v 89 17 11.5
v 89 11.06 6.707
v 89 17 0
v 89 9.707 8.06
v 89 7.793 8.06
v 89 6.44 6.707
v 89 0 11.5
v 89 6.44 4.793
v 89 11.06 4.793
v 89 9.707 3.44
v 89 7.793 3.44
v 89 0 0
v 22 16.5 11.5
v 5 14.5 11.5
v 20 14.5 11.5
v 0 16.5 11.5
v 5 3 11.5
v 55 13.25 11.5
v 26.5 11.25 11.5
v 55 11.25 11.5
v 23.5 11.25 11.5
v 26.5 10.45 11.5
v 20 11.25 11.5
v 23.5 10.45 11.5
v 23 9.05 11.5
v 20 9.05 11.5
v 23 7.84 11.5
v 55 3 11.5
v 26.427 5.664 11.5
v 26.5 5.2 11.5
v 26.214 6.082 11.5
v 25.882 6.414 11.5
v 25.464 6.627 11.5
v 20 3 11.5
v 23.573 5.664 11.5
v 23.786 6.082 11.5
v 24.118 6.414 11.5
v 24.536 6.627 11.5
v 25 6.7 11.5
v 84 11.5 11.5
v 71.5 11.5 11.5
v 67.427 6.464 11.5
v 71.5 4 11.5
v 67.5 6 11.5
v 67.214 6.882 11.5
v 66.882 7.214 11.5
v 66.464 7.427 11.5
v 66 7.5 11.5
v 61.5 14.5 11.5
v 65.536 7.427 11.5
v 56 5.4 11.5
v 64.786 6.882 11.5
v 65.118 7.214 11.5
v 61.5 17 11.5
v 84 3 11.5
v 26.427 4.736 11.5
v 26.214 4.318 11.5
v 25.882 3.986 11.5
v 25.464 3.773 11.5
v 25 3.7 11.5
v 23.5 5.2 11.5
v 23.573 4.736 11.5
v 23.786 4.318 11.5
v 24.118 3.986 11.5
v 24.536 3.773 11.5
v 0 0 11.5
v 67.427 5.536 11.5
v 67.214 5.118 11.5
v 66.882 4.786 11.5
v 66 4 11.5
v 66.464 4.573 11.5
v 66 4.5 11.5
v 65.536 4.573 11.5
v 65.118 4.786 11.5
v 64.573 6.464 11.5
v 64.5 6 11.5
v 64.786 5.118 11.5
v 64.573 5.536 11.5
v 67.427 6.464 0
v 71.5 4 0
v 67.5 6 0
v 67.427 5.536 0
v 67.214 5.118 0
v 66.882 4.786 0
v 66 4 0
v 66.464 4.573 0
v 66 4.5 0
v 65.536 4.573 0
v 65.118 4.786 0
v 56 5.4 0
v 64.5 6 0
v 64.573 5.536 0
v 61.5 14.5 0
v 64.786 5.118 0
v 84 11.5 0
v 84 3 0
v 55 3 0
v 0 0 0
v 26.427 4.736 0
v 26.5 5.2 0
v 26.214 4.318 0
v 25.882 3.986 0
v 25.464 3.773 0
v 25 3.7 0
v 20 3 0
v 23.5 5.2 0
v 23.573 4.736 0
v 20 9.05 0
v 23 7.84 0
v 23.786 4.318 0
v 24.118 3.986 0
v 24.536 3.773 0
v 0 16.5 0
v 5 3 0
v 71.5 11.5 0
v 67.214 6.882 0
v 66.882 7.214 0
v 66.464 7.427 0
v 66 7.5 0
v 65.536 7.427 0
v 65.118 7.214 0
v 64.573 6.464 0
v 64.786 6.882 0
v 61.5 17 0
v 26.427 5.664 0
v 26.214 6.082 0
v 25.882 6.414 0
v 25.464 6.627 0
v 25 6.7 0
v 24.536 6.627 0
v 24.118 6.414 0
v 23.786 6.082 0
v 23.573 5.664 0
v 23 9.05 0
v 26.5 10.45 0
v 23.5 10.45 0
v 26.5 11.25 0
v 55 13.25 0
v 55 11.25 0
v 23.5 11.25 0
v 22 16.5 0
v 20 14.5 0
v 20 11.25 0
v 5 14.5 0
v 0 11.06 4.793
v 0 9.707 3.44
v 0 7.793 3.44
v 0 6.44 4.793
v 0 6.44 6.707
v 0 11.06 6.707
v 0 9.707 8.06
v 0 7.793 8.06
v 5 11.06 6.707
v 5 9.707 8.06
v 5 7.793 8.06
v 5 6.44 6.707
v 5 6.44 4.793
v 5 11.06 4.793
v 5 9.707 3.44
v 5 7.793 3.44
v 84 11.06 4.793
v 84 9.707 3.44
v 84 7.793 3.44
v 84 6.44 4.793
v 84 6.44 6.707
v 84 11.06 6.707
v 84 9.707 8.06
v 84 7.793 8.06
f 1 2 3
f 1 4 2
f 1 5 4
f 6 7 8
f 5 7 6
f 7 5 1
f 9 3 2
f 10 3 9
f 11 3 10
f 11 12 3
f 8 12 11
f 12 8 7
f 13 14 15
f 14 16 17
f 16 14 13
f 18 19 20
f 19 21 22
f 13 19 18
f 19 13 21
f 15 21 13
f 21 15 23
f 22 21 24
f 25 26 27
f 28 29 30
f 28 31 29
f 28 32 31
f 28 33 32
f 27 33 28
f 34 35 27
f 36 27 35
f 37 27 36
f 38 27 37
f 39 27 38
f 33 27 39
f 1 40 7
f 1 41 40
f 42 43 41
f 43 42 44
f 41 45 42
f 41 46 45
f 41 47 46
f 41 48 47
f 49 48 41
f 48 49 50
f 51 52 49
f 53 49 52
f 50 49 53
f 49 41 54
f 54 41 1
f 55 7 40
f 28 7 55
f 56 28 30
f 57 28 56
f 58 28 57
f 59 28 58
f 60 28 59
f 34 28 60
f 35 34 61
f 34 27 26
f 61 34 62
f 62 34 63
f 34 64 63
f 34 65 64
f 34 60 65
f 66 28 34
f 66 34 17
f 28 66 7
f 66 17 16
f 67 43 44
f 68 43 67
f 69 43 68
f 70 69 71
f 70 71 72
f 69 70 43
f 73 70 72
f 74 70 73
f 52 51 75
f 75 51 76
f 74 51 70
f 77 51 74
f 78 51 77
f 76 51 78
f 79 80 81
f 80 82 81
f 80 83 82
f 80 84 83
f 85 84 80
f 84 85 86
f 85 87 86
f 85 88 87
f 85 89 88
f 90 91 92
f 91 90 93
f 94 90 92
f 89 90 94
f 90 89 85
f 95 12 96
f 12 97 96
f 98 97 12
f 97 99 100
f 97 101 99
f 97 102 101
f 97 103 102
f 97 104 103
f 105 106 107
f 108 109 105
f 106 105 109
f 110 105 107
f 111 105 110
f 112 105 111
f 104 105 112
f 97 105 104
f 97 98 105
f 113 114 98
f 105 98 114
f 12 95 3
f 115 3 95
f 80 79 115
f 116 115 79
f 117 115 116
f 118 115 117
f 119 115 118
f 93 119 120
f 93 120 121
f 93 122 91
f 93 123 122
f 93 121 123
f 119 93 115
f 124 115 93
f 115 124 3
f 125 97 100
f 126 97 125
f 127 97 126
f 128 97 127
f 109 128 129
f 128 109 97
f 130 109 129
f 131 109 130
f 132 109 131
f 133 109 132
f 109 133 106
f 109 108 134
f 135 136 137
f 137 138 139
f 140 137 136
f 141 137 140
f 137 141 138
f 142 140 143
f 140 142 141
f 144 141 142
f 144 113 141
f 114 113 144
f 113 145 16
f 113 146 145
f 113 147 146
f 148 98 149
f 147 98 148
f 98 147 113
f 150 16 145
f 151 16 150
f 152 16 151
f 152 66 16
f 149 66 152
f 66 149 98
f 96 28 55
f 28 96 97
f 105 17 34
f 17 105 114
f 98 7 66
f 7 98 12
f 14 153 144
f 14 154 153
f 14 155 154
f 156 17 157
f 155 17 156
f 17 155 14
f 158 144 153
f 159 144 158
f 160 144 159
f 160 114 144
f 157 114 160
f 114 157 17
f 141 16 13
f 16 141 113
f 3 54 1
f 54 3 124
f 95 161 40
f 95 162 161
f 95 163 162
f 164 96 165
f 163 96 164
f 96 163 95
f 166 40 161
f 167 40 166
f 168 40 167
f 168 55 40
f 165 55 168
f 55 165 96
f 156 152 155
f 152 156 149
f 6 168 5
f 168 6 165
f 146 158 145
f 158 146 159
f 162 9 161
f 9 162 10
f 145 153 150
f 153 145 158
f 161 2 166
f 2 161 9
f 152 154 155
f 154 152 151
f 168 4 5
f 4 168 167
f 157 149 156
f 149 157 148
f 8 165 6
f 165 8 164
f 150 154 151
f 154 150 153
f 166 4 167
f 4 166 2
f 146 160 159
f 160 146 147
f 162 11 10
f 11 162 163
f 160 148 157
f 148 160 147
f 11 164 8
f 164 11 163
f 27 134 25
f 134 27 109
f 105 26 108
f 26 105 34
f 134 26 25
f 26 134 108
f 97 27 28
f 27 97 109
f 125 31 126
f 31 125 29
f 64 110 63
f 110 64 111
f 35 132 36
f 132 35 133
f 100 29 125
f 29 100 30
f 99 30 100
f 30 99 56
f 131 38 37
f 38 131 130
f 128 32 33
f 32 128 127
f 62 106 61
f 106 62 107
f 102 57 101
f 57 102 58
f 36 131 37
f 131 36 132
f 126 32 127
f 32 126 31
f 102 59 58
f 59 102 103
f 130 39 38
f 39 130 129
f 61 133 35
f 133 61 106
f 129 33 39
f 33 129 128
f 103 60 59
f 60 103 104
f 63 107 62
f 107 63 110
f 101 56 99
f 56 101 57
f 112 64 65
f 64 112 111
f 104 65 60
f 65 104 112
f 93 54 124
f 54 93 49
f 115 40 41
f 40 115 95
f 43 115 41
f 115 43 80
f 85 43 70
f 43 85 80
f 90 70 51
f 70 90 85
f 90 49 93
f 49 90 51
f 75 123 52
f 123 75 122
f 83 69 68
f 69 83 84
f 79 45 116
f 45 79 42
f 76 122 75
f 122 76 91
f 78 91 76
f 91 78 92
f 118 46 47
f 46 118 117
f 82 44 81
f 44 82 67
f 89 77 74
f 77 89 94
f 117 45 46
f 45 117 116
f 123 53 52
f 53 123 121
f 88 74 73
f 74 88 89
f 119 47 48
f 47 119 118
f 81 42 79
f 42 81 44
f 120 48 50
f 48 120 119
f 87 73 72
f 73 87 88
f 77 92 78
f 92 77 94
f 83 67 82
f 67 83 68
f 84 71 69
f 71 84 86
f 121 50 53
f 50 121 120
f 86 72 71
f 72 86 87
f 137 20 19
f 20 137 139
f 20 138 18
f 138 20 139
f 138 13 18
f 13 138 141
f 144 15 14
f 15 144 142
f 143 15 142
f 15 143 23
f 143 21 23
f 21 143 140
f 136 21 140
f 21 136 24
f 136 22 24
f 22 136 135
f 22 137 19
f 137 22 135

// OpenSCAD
//Based on device description in
//'A self-priming, roller-free, miniature, peristaltic pump operable with a single, reciprocating actuator'
//Sensors and Actuators A 160 (2010) 141�146
//Viktor Shkolnikov et. al.

//User parameters:

//Other part sizes:
couplingPlateSideLength = 11.5;
couplingPlateThickness = 0;
tubingOuterDiameter = 7.35-2.35; //edit
compressedTubingWidth = 10;
compressedTubingHeight = 1.7-.7;  //edit

//Mechanical Parameters
couplingMountBaseThickness = 5;
handleLengthOffset = 50;
handleThickness = 2;
upstreamCheckLengthOffset = 15; 
bottomUpstreamTabThickness = 3;
topUpstreamTabThickness = 3;
upstreamTabSpacing = 1-.5; //edit
upstreamTaperHeightRatio = 0.8; // starting height for taper
bottomUpstreamTabConstrictionRatio = 0.7;
topUpstreamTabConstrictionRatio = 0.2;
downstreamCheckLength = 21+7; //edit
downstreamCheckThickness = 3.5+2; //edit
baseThickness = 3;
handleDownstreamClearance = 2-1; //edit
downstreamTaperLength = 10;
taperStartConstrictionRatio = 0.35;
shorten=3; //editt

//Computed parameters
totalLengthA = 2*(couplingPlateThickness+couplingMountBaseThickness)+handleLengthOffset;
totalLengthB = handleDownstreamClearance+downstreamCheckLength;
totalLength = totalLengthA+totalLengthB;
totalWidth = max(couplingPlateSideLength,compressedTubingWidth);
holePrintAngle = 360/16;
constrictionLength2 = topUpstreamTabConstrictionRatio*(tubingOuterDiameter-compressedTubingHeight);
constrictionLength = bottomUpstreamTabConstrictionRatio*(tubingOuterDiameter-compressedTubingHeight);
upstreamCheckTabLength = constrictionLength+(couplingPlateSideLength-tubingOuterDiameter)/2;
upstreamCheckTabLength2 = constrictionLength2+(couplingPlateSideLength-tubingOuterDiameter)/2;
handleTubingOffset = tubingOuterDiameter-compressedTubingHeight-constrictionLength;
downstreamTaperStart = compressedTubingHeight+taperStartConstrictionRatio*(tubingOuterDiameter-compressedTubingHeight);

//Build it
//projection(cut = false) 
union ()
{
	//Base and coupling mounts
	difference ()
	{
		union ()
		{
			cube([totalLength,baseThickness,totalWidth]);
			translate([couplingPlateThickness,baseThickness,0])
			cube([couplingMountBaseThickness,couplingPlateSideLength+handleThickness,totalWidth]);
			translate([0,baseThickness+couplingPlateSideLength,0])
			cube([couplingPlateThickness,handleThickness,totalWidth]);
			translate([totalLength,0,0]) mirror([1,0,0])
			{
				translate([couplingPlateThickness,baseThickness,0])
				cube([couplingMountBaseThickness,couplingPlateSideLength+downstreamCheckThickness-shorten,totalWidth]);
				translate([0,baseThickness+couplingPlateSideLength,0])
				cube([couplingPlateThickness,downstreamCheckThickness,totalWidth]);
			}
		}

		union ()
		{
			translate([-0.01,baseThickness+couplingPlateSideLength/2,totalWidth/2])
			rotate(a=90,v=[0,1,0]) rotate(a=holePrintAngle,v=[0,0,1])
			cylinder(r=tubingOuterDiameter/2,h=totalLength+0.02,$fn=8);

		}
	}

	//Upstream Check Bottom and Bottom Contour
	translate([couplingPlateThickness+couplingMountBaseThickness+upstreamCheckLengthOffset,baseThickness,0])
	difference(){
		union ()
		{
			cube([bottomUpstreamTabThickness,upstreamCheckTabLength,totalWidth]);
			translate([bottomUpstreamTabThickness,0,0])
				linear_extrude (height=totalWidth)
					polygon([[0,0],[0,upstreamTaperHeightRatio*upstreamCheckTabLength],[handleLengthOffset-upstreamCheckLengthOffset-bottomUpstreamTabThickness,0]]);
		}
		linear_extrude (height=totalWidth+1) translate([5,2.2,0])  circle(1.5,$fn=20);
	}
	//Handle
	translate([couplingPlateThickness+couplingMountBaseThickness,baseThickness+couplingPlateSideLength,0])
	union ()
	{
		linear_extrude (height=totalWidth)
		polygon([[0,0],[upstreamCheckLengthOffset,0],[upstreamCheckLengthOffset,-(couplingPlateSideLength-tubingOuterDiameter)/2],
			[upstreamCheckLengthOffset+bottomUpstreamTabThickness+upstreamTabSpacing,-(couplingPlateSideLength-tubingOuterDiameter)/2],
			[upstreamCheckLengthOffset+bottomUpstreamTabThickness+upstreamTabSpacing,-(couplingPlateSideLength-tubingOuterDiameter)/2-constrictionLength2],
			[upstreamCheckLengthOffset+bottomUpstreamTabThickness+upstreamTabSpacing+topUpstreamTabThickness,-(couplingPlateSideLength-tubingOuterDiameter)/2-constrictionLength2],
			[upstreamCheckLengthOffset+bottomUpstreamTabThickness+upstreamTabSpacing+topUpstreamTabThickness,-(couplingPlateSideLength-tubingOuterDiameter)/2],
			[handleLengthOffset,-(couplingPlateSideLength-tubingOuterDiameter)/2],
			[handleLengthOffset,handleThickness-(couplingPlateSideLength-tubingOuterDiameter)/2],
			//[upstreamCheckLengthOffset+handleThickness,handleThickness-(couplingPlateSideLength-tubingOuterDiameter)/2],
			[upstreamCheckLengthOffset+handleThickness,handleThickness],
			[-couplingPlateThickness-couplingMountBaseThickness,handleThickness]]);

	}

	//Downstream check
	translate([totalLength-couplingPlateThickness-couplingMountBaseThickness,baseThickness,0])  mirror([1,0,0]) 
	difference(){
		union ()
		{
			translate([0,couplingPlateSideLength-shorten,0]) cube([downstreamCheckLength-downstreamCheckThickness,downstreamCheckThickness,totalWidth]);
			translate([downstreamCheckLength-downstreamTaperLength-downstreamCheckThickness,compressedTubingHeight,0])
				cube([downstreamCheckThickness,couplingPlateSideLength-compressedTubingHeight+0.01,totalWidth]);
//			translate([downstreamCheckLength-downstreamCheckThickness,downstreamTaperStart,0])
//				cube([downstreamCheckThickness,couplingPlateSideLength-downstreamTaperStart+0.01,totalWidth]);
			linear_extrude (height=totalWidth)
				polygon([[downstreamCheckLength-downstreamTaperLength,compressedTubingHeight],
					[downstreamCheckLength-downstreamTaperLength-downstreamCheckThickness,couplingPlateSideLength],
					[downstreamCheckLength-downstreamCheckThickness,couplingPlateSideLength],
					[downstreamCheckLength,downstreamTaperStart]]);

		}
		union()
		{
			linear_extrude (height=totalWidth+1) translate([downstreamCheckLength-downstreamTaperLength,compressedTubingHeight+2,0]) circle(1.5,$fn=20);
		}
	}
}
